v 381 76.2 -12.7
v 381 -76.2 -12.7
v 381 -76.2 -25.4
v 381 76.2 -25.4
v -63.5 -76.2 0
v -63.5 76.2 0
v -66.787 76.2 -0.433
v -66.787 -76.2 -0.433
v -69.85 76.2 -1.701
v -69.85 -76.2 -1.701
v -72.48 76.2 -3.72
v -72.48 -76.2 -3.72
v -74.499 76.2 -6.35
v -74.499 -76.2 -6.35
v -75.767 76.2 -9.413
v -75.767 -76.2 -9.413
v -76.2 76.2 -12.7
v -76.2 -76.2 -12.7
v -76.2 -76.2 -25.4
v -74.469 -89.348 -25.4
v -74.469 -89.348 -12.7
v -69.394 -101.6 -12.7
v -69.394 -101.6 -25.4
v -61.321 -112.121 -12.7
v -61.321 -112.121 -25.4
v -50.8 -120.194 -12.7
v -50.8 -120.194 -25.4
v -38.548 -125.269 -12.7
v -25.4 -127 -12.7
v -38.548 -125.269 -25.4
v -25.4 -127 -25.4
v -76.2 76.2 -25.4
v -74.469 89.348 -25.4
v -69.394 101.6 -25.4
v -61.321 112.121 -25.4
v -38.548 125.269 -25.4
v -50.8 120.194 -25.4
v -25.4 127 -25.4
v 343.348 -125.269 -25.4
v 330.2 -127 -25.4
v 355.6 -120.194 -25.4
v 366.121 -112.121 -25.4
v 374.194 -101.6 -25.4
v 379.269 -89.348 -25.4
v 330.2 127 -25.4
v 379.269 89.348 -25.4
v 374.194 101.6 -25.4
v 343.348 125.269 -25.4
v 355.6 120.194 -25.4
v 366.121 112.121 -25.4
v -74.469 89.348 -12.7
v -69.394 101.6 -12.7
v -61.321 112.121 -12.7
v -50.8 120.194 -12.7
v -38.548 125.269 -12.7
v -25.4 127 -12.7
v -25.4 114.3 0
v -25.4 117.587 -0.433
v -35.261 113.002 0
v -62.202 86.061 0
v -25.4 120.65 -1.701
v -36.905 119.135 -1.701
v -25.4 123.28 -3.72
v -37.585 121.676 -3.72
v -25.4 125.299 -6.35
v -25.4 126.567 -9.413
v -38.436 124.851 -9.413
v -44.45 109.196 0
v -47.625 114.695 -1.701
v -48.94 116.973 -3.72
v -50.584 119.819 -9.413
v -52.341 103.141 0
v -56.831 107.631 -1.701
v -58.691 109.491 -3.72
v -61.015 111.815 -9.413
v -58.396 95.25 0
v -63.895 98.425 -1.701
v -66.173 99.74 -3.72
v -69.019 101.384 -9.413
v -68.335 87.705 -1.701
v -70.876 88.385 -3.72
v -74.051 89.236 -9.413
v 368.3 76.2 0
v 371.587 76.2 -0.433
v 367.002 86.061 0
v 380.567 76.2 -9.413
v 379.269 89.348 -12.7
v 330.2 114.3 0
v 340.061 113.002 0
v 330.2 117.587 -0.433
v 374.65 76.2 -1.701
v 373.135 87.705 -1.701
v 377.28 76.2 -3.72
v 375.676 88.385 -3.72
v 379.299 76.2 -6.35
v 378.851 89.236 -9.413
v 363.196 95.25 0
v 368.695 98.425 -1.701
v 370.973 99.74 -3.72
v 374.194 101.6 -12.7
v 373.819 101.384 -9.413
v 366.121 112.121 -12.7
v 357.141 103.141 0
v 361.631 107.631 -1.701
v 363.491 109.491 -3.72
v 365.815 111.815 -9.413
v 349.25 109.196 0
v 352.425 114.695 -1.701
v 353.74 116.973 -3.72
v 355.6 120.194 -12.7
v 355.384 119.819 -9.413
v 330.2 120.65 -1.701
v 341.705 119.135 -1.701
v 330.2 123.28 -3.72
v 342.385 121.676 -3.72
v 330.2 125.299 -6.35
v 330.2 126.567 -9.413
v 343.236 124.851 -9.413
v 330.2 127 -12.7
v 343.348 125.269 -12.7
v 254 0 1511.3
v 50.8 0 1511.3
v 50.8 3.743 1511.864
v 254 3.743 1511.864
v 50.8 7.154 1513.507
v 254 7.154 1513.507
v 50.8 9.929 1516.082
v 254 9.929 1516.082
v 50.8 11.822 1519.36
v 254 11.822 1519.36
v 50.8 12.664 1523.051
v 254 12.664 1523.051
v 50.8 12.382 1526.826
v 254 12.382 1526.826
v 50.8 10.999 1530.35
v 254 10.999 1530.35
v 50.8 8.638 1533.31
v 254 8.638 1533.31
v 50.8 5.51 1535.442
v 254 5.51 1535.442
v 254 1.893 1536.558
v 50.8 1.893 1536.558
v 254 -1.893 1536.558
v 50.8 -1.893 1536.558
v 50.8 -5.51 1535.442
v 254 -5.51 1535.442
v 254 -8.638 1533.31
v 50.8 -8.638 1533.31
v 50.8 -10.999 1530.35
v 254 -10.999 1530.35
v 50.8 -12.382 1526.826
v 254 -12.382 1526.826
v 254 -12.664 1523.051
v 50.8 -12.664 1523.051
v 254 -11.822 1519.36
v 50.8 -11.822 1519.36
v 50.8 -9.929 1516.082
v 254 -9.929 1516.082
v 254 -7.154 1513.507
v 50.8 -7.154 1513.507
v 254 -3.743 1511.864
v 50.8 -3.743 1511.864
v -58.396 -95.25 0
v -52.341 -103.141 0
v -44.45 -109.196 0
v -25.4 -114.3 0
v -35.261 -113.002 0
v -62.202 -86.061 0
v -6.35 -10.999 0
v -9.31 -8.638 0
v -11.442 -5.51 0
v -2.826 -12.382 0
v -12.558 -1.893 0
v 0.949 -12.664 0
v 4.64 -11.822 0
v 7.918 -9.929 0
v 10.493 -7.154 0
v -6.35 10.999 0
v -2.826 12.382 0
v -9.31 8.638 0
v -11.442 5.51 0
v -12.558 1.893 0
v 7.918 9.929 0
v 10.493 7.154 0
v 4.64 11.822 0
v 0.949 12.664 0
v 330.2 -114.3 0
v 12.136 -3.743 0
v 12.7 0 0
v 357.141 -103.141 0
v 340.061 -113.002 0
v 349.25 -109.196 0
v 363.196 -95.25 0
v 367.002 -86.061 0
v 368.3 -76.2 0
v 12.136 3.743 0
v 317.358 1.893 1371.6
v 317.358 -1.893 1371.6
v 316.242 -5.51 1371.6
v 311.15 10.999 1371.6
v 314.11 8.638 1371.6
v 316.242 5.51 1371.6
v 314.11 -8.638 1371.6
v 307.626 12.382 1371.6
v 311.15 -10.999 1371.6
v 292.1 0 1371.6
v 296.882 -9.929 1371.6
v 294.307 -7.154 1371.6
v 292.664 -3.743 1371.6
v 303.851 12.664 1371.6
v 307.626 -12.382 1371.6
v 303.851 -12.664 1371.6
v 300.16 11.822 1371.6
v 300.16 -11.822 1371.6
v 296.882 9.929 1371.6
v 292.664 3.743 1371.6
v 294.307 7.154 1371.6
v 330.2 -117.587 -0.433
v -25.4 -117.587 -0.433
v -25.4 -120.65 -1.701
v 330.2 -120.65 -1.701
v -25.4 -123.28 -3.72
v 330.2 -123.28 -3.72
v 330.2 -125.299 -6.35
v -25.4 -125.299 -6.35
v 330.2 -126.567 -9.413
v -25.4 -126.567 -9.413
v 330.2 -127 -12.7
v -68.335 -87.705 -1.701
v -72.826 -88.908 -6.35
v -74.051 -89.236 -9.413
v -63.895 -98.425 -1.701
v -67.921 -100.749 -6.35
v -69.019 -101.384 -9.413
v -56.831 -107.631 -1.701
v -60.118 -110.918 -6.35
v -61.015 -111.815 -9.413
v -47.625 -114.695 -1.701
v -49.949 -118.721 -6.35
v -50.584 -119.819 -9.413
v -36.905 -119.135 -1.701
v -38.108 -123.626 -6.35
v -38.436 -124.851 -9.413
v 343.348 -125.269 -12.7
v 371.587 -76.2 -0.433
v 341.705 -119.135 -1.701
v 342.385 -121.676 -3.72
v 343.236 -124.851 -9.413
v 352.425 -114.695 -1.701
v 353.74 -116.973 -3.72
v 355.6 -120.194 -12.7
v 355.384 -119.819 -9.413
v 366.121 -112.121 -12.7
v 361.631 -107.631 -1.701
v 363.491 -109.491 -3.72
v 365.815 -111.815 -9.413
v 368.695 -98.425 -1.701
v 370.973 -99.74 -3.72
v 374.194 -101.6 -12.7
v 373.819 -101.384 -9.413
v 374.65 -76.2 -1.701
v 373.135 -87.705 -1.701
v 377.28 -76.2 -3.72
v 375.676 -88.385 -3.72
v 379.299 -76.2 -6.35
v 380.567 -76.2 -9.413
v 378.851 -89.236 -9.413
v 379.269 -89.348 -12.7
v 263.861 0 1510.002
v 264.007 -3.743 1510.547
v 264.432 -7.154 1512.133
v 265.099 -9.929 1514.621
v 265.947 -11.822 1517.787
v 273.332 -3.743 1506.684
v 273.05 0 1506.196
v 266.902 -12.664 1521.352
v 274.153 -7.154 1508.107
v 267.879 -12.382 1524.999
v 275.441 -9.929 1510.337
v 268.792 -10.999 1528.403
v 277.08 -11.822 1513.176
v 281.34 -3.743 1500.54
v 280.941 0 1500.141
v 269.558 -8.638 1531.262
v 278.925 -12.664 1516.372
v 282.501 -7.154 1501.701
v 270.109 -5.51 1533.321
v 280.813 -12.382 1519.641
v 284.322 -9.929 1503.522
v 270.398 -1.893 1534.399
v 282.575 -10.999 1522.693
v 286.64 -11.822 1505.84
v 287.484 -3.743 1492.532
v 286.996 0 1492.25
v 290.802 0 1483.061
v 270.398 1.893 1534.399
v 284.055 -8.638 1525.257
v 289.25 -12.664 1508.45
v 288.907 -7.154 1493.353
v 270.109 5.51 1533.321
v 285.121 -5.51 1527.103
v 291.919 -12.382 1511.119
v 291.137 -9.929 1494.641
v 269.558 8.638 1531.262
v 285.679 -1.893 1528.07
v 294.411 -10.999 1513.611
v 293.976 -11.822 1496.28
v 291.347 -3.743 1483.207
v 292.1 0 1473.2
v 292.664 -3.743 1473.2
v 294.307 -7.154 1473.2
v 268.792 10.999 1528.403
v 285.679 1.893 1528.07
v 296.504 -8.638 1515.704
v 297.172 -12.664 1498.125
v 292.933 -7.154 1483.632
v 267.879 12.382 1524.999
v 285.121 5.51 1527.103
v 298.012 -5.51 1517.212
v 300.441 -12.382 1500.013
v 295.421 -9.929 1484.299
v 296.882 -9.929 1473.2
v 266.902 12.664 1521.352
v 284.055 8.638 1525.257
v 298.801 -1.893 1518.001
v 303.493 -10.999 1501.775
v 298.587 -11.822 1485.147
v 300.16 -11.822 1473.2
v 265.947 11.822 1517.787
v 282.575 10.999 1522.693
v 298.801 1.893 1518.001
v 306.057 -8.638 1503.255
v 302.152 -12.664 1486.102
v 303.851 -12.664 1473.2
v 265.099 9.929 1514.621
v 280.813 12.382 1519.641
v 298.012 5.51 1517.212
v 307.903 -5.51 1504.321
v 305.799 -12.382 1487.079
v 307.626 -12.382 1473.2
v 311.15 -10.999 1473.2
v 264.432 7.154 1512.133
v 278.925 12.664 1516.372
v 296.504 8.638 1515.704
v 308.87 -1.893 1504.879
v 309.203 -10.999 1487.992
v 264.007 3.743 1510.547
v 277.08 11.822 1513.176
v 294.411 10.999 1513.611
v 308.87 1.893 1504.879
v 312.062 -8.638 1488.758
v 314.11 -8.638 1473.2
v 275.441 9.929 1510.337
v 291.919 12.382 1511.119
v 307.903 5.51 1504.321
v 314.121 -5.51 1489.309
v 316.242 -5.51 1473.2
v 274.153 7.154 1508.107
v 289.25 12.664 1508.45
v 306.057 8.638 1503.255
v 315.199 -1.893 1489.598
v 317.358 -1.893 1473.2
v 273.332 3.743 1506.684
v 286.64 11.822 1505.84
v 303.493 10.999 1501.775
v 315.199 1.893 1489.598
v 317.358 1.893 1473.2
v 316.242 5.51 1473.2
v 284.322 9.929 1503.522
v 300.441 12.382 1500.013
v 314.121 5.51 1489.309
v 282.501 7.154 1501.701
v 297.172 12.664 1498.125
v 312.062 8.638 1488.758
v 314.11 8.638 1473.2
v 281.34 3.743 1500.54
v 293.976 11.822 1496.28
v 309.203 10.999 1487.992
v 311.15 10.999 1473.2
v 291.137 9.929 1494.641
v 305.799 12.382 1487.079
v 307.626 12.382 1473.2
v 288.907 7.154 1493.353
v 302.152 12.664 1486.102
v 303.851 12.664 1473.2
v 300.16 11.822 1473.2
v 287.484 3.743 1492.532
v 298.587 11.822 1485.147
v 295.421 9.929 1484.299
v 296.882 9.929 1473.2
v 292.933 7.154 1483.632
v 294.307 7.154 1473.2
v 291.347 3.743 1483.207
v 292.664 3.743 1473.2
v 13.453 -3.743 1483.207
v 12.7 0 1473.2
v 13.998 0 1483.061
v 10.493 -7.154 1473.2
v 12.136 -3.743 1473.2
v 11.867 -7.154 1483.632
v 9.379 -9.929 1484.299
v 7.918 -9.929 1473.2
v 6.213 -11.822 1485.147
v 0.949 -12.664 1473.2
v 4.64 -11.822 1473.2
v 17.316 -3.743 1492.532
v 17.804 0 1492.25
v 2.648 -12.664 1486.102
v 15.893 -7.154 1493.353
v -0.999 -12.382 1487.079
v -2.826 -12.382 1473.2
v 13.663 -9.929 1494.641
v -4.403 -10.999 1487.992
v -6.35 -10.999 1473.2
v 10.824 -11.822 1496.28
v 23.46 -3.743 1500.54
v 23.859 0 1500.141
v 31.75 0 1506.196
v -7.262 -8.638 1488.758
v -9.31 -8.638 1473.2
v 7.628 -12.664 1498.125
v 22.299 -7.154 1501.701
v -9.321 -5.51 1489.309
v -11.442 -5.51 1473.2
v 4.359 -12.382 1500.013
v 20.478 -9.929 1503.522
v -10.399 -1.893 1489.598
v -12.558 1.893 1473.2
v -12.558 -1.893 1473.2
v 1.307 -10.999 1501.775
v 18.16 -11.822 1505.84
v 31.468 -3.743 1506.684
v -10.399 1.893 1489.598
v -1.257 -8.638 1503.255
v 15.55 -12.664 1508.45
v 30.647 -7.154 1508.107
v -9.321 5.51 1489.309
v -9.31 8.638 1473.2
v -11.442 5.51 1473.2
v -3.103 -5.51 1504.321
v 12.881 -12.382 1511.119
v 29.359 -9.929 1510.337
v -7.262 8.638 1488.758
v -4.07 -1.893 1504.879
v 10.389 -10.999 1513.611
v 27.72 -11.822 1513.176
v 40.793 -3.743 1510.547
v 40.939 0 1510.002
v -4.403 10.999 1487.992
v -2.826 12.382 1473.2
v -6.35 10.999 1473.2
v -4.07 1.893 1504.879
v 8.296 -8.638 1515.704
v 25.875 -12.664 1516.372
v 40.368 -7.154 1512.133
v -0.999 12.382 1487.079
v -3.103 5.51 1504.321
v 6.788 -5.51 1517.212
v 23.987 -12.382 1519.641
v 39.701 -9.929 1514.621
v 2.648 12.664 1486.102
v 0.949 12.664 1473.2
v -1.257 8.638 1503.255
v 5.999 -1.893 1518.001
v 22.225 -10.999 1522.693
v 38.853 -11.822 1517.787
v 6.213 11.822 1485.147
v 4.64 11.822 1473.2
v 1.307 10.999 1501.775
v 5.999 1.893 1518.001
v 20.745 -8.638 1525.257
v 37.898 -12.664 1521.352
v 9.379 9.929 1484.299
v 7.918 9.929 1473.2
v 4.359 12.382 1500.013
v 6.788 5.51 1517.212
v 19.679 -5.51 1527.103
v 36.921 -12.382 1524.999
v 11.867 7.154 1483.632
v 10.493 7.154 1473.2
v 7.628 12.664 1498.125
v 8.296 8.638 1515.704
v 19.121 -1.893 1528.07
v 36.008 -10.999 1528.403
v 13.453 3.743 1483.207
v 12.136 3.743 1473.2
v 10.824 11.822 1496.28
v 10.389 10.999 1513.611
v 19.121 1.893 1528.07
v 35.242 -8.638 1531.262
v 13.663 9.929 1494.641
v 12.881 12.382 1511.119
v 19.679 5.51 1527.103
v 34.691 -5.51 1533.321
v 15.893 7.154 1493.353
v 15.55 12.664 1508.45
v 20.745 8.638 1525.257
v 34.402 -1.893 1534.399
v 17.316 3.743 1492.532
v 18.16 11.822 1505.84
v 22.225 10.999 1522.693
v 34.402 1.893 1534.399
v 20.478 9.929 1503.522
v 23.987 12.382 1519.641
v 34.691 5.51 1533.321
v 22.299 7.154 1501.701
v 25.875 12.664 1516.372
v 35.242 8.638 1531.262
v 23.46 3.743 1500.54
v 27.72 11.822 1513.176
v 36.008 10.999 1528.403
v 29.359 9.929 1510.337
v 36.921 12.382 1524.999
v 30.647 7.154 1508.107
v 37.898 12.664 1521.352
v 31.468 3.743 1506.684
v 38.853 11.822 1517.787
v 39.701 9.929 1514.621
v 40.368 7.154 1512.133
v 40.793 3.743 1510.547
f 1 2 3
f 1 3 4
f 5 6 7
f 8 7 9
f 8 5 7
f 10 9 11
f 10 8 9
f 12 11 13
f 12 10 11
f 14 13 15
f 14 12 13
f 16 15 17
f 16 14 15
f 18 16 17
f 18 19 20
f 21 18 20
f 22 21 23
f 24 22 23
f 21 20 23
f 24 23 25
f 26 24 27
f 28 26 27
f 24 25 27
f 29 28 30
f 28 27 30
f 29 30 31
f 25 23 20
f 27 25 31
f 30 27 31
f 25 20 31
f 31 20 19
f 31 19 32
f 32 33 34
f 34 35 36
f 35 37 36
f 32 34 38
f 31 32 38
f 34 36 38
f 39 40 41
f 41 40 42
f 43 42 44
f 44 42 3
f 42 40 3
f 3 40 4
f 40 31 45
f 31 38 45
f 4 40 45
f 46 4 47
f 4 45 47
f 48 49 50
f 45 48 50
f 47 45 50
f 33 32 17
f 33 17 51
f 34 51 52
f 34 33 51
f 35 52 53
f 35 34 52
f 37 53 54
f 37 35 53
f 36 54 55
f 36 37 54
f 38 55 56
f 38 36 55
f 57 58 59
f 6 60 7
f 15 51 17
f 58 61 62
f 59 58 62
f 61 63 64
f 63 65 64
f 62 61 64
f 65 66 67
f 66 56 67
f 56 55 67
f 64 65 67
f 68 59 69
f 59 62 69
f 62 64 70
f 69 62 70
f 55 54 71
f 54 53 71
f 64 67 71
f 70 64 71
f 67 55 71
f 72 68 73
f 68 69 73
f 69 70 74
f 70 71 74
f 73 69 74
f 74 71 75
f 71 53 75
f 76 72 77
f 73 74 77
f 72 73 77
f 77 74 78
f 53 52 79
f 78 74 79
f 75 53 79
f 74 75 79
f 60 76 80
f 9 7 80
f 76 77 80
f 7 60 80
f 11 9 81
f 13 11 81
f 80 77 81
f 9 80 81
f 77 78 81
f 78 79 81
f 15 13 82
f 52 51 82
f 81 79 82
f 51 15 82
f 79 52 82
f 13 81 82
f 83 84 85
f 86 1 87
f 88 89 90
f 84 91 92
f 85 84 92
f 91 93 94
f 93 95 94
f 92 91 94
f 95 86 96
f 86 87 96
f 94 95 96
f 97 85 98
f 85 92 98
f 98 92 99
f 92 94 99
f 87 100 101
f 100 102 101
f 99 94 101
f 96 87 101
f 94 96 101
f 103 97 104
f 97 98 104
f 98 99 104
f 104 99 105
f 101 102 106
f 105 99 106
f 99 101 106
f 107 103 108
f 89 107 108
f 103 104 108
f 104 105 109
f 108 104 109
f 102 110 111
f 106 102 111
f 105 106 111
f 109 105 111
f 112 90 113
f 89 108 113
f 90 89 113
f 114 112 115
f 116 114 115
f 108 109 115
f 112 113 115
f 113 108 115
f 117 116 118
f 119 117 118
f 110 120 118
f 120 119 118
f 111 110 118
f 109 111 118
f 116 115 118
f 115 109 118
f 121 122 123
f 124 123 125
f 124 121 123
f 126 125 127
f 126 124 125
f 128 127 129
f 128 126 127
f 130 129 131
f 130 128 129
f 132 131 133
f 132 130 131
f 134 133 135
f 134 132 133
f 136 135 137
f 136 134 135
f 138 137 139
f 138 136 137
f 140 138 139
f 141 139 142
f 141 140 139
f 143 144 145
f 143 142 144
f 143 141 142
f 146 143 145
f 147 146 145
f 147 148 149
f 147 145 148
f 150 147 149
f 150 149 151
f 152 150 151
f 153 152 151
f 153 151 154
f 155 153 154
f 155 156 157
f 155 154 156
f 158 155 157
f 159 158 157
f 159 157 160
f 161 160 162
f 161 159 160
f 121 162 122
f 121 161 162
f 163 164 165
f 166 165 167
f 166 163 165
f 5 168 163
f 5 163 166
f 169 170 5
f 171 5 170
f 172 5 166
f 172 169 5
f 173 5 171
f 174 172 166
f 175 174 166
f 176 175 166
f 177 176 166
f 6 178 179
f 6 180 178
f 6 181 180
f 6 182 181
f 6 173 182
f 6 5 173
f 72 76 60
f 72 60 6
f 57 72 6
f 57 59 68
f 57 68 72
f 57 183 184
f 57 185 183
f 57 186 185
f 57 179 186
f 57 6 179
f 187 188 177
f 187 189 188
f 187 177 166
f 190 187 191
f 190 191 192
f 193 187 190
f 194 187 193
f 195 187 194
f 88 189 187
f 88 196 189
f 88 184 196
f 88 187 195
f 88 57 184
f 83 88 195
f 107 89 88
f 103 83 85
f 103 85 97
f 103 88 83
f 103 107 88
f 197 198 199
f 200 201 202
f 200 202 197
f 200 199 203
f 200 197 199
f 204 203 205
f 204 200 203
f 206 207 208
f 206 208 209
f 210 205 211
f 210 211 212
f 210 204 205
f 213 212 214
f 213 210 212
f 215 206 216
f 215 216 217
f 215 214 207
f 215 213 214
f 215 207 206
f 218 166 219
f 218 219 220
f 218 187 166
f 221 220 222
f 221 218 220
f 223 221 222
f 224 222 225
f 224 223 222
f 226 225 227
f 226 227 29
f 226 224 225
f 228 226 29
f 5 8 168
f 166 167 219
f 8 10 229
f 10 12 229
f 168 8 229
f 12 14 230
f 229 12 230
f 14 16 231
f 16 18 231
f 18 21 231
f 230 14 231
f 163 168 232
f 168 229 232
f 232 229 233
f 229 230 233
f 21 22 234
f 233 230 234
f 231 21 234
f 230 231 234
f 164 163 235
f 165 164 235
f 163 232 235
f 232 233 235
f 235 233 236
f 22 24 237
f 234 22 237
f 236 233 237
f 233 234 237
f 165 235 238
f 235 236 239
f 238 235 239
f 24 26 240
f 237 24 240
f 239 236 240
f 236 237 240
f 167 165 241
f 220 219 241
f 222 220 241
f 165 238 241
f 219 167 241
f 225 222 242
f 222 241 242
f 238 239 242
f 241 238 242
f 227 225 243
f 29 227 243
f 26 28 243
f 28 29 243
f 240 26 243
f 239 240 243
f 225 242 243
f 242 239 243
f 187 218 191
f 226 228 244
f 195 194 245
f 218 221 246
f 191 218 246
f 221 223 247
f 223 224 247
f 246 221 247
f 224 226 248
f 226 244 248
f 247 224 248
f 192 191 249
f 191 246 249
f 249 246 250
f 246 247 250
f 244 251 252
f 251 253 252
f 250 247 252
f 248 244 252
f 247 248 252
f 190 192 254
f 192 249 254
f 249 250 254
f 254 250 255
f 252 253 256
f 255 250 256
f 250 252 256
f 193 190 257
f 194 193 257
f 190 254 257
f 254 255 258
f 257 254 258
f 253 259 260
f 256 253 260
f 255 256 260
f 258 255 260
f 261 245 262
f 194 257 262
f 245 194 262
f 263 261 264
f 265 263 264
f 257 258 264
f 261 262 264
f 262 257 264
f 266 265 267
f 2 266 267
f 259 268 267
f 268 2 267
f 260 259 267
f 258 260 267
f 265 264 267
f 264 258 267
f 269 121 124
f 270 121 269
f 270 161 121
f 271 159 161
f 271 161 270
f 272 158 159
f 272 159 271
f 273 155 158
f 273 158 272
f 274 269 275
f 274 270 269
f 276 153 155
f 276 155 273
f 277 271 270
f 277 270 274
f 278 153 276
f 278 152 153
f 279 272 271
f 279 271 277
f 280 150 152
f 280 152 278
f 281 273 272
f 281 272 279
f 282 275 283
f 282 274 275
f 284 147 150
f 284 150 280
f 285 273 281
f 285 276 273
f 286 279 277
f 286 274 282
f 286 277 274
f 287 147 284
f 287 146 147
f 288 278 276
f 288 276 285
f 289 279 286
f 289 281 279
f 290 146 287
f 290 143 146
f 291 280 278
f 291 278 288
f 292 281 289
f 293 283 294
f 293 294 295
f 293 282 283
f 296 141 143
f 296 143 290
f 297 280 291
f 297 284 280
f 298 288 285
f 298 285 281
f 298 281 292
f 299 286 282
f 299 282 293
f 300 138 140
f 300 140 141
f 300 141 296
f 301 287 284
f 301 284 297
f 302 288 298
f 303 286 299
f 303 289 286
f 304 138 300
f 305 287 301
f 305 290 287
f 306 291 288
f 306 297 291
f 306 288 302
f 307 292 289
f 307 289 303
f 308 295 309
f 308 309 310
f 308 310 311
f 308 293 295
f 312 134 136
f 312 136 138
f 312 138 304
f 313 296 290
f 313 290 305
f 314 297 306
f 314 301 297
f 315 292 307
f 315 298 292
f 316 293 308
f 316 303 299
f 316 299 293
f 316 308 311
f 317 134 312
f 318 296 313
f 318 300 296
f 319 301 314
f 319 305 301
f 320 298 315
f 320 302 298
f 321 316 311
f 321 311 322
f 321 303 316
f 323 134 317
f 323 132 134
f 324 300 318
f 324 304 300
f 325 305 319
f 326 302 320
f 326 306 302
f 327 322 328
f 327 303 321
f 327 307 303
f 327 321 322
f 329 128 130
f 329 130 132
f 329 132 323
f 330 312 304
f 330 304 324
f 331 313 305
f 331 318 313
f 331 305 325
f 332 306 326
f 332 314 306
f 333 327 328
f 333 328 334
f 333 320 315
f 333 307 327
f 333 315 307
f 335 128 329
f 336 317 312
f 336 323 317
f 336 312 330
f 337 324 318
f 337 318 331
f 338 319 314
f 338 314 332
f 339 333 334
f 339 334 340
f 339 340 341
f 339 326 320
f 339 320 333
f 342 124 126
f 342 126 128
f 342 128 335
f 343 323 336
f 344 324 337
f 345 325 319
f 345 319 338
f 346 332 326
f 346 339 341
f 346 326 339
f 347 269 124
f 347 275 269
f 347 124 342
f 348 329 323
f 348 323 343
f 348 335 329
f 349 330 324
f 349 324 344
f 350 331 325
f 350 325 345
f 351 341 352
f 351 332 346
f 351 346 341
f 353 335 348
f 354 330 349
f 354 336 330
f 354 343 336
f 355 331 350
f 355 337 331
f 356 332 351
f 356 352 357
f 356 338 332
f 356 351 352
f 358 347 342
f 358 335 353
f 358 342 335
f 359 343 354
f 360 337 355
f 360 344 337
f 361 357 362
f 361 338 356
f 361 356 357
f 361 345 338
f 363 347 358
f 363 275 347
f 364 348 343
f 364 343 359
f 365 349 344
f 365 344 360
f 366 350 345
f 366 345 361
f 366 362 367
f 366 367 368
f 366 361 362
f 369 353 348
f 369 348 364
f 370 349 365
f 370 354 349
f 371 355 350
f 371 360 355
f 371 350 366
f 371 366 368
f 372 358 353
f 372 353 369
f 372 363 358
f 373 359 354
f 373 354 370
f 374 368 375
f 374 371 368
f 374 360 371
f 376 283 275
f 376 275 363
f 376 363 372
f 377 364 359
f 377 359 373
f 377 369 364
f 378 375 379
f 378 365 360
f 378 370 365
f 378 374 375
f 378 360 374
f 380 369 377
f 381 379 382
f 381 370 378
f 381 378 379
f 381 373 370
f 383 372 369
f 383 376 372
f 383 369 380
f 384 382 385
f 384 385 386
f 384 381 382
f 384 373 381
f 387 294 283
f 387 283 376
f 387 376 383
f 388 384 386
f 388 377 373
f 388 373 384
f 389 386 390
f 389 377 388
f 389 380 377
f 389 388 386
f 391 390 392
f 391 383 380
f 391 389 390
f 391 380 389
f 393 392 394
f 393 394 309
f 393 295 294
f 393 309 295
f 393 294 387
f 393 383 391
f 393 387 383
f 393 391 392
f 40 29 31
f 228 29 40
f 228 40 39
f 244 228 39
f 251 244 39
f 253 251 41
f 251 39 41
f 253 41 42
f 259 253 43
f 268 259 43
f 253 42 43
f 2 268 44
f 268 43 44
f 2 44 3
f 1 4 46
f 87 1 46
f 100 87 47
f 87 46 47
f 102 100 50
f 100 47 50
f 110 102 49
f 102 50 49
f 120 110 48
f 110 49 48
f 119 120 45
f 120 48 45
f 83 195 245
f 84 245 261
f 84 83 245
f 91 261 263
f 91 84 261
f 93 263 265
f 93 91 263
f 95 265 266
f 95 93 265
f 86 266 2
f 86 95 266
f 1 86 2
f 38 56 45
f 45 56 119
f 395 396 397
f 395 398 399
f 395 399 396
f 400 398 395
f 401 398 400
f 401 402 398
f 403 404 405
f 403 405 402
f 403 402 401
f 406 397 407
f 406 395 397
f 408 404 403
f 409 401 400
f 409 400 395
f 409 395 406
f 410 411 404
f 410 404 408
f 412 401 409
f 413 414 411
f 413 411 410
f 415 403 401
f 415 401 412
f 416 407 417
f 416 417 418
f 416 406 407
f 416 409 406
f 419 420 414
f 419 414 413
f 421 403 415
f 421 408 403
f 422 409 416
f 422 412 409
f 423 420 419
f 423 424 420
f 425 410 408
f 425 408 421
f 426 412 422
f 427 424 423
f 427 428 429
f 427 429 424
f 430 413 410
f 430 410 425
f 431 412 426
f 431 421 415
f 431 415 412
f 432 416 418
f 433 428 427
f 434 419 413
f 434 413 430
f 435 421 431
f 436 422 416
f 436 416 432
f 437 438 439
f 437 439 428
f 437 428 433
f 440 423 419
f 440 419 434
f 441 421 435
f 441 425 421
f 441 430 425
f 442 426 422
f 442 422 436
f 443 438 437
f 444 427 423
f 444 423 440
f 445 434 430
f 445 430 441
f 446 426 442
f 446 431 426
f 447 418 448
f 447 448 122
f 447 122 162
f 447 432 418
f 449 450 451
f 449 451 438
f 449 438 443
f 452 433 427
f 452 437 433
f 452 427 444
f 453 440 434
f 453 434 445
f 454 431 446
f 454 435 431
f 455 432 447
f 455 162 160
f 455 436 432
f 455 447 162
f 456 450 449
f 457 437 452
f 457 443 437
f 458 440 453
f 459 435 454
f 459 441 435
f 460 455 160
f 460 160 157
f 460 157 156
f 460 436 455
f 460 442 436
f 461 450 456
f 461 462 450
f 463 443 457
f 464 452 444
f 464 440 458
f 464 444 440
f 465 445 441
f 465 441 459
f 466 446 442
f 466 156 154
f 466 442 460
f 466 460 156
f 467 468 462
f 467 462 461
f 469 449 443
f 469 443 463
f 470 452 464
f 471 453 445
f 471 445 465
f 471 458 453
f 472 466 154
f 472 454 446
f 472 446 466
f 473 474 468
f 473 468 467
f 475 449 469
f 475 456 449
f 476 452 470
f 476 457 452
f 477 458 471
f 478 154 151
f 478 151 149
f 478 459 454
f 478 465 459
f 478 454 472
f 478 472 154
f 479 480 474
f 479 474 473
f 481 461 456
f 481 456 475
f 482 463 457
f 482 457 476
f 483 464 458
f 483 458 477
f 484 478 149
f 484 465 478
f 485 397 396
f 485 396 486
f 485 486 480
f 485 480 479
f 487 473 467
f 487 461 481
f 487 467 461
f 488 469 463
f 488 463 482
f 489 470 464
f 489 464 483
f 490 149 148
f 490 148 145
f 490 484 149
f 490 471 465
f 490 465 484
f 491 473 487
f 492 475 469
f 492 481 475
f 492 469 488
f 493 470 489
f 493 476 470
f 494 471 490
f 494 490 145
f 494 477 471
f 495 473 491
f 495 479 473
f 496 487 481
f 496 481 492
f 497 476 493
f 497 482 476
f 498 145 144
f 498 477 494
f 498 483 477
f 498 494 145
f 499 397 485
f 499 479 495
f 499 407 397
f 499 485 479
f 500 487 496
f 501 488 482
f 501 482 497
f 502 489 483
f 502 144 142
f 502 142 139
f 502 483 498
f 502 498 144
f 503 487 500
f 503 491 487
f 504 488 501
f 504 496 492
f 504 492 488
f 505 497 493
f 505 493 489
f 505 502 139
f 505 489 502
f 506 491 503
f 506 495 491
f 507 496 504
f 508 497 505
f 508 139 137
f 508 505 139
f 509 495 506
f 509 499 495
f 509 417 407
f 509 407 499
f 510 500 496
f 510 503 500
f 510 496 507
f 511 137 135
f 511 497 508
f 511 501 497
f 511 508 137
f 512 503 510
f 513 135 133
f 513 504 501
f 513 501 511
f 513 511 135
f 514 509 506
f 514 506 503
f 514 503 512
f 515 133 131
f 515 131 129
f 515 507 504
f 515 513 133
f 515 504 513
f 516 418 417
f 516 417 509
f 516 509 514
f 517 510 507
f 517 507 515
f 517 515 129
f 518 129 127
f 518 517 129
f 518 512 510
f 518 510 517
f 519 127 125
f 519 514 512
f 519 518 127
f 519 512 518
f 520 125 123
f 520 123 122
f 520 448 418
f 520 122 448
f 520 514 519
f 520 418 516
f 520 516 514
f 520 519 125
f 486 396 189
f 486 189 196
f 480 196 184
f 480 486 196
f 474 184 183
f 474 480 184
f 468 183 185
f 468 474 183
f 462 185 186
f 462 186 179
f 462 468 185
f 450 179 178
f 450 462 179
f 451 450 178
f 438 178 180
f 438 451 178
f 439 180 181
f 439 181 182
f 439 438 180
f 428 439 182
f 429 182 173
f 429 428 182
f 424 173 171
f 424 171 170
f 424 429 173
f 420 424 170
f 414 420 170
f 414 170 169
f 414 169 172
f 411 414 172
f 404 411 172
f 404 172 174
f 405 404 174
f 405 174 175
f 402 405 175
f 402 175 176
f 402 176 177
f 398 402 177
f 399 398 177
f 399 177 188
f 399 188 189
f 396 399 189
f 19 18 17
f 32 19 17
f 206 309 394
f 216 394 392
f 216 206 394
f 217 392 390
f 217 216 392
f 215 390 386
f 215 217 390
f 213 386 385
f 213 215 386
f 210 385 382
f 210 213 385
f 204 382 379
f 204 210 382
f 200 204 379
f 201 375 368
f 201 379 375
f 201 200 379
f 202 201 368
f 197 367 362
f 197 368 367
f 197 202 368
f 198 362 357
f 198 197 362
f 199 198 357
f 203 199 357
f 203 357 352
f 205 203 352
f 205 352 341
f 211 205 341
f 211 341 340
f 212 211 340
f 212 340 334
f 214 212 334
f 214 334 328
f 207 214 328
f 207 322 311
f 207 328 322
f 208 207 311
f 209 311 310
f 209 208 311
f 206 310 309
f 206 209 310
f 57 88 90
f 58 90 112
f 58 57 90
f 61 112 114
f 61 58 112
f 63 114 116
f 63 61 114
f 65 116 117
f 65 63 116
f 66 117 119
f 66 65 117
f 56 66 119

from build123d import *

# Parameters (mm, degrees)
F0_W     = 457.2
F0_H     = 254
F1_DEPTH = 25.4
F2_R     = 50.8
F3_R     = 12.7
F4_R     = 12.7


with BuildPart() as f1:
    # F0 (on Top) → F1 (new body)
    with BuildSketch(Plane.XY):
        with Locations((152.4, 0)):
            Rectangle(F0_W, F0_H)
    extrude(amount=-F1_DEPTH)

    # F2
    f2_edges = [f1.edges().sort_by_distance(p)[0] for p in [
        (-76.2, -127, -12.7),
        (381, -127, -12.7),
        (381, 127, -12.7),
        (-76.2, 127, -12.7),
    ]]
    fillet(f2_edges, radius=F2_R)

    # F3
    f3_edges = [f1.edges().sort_by_distance(p)[0] for p in [
        (152.4, -127, 0),
    ]]
    fillet(f3_edges, radius=F3_R)

    # F6: sweep along a path in F5
    with BuildLine(Plane.XZ) as f6_path:
        Line((0, 0), (0, 1473.2))
        ThreePointArc((0, 1473.2), (14.8789755157, 1509.1210244843), (50.8, 1524))
        Line((50.8, 1524), (254, 1524))
        ThreePointArc((254, 1524), (289.9210244843, 1509.1210244843), (304.8, 1473.2))
        Line((304.8, 1473.2), (304.8, 1371.6))
    # F4 (on face) → F6 (sweep)
    with BuildSketch(Plane.XY):
        Circle(F4_R)
    sweep(path=f6_path.line)


solid = f1.part
